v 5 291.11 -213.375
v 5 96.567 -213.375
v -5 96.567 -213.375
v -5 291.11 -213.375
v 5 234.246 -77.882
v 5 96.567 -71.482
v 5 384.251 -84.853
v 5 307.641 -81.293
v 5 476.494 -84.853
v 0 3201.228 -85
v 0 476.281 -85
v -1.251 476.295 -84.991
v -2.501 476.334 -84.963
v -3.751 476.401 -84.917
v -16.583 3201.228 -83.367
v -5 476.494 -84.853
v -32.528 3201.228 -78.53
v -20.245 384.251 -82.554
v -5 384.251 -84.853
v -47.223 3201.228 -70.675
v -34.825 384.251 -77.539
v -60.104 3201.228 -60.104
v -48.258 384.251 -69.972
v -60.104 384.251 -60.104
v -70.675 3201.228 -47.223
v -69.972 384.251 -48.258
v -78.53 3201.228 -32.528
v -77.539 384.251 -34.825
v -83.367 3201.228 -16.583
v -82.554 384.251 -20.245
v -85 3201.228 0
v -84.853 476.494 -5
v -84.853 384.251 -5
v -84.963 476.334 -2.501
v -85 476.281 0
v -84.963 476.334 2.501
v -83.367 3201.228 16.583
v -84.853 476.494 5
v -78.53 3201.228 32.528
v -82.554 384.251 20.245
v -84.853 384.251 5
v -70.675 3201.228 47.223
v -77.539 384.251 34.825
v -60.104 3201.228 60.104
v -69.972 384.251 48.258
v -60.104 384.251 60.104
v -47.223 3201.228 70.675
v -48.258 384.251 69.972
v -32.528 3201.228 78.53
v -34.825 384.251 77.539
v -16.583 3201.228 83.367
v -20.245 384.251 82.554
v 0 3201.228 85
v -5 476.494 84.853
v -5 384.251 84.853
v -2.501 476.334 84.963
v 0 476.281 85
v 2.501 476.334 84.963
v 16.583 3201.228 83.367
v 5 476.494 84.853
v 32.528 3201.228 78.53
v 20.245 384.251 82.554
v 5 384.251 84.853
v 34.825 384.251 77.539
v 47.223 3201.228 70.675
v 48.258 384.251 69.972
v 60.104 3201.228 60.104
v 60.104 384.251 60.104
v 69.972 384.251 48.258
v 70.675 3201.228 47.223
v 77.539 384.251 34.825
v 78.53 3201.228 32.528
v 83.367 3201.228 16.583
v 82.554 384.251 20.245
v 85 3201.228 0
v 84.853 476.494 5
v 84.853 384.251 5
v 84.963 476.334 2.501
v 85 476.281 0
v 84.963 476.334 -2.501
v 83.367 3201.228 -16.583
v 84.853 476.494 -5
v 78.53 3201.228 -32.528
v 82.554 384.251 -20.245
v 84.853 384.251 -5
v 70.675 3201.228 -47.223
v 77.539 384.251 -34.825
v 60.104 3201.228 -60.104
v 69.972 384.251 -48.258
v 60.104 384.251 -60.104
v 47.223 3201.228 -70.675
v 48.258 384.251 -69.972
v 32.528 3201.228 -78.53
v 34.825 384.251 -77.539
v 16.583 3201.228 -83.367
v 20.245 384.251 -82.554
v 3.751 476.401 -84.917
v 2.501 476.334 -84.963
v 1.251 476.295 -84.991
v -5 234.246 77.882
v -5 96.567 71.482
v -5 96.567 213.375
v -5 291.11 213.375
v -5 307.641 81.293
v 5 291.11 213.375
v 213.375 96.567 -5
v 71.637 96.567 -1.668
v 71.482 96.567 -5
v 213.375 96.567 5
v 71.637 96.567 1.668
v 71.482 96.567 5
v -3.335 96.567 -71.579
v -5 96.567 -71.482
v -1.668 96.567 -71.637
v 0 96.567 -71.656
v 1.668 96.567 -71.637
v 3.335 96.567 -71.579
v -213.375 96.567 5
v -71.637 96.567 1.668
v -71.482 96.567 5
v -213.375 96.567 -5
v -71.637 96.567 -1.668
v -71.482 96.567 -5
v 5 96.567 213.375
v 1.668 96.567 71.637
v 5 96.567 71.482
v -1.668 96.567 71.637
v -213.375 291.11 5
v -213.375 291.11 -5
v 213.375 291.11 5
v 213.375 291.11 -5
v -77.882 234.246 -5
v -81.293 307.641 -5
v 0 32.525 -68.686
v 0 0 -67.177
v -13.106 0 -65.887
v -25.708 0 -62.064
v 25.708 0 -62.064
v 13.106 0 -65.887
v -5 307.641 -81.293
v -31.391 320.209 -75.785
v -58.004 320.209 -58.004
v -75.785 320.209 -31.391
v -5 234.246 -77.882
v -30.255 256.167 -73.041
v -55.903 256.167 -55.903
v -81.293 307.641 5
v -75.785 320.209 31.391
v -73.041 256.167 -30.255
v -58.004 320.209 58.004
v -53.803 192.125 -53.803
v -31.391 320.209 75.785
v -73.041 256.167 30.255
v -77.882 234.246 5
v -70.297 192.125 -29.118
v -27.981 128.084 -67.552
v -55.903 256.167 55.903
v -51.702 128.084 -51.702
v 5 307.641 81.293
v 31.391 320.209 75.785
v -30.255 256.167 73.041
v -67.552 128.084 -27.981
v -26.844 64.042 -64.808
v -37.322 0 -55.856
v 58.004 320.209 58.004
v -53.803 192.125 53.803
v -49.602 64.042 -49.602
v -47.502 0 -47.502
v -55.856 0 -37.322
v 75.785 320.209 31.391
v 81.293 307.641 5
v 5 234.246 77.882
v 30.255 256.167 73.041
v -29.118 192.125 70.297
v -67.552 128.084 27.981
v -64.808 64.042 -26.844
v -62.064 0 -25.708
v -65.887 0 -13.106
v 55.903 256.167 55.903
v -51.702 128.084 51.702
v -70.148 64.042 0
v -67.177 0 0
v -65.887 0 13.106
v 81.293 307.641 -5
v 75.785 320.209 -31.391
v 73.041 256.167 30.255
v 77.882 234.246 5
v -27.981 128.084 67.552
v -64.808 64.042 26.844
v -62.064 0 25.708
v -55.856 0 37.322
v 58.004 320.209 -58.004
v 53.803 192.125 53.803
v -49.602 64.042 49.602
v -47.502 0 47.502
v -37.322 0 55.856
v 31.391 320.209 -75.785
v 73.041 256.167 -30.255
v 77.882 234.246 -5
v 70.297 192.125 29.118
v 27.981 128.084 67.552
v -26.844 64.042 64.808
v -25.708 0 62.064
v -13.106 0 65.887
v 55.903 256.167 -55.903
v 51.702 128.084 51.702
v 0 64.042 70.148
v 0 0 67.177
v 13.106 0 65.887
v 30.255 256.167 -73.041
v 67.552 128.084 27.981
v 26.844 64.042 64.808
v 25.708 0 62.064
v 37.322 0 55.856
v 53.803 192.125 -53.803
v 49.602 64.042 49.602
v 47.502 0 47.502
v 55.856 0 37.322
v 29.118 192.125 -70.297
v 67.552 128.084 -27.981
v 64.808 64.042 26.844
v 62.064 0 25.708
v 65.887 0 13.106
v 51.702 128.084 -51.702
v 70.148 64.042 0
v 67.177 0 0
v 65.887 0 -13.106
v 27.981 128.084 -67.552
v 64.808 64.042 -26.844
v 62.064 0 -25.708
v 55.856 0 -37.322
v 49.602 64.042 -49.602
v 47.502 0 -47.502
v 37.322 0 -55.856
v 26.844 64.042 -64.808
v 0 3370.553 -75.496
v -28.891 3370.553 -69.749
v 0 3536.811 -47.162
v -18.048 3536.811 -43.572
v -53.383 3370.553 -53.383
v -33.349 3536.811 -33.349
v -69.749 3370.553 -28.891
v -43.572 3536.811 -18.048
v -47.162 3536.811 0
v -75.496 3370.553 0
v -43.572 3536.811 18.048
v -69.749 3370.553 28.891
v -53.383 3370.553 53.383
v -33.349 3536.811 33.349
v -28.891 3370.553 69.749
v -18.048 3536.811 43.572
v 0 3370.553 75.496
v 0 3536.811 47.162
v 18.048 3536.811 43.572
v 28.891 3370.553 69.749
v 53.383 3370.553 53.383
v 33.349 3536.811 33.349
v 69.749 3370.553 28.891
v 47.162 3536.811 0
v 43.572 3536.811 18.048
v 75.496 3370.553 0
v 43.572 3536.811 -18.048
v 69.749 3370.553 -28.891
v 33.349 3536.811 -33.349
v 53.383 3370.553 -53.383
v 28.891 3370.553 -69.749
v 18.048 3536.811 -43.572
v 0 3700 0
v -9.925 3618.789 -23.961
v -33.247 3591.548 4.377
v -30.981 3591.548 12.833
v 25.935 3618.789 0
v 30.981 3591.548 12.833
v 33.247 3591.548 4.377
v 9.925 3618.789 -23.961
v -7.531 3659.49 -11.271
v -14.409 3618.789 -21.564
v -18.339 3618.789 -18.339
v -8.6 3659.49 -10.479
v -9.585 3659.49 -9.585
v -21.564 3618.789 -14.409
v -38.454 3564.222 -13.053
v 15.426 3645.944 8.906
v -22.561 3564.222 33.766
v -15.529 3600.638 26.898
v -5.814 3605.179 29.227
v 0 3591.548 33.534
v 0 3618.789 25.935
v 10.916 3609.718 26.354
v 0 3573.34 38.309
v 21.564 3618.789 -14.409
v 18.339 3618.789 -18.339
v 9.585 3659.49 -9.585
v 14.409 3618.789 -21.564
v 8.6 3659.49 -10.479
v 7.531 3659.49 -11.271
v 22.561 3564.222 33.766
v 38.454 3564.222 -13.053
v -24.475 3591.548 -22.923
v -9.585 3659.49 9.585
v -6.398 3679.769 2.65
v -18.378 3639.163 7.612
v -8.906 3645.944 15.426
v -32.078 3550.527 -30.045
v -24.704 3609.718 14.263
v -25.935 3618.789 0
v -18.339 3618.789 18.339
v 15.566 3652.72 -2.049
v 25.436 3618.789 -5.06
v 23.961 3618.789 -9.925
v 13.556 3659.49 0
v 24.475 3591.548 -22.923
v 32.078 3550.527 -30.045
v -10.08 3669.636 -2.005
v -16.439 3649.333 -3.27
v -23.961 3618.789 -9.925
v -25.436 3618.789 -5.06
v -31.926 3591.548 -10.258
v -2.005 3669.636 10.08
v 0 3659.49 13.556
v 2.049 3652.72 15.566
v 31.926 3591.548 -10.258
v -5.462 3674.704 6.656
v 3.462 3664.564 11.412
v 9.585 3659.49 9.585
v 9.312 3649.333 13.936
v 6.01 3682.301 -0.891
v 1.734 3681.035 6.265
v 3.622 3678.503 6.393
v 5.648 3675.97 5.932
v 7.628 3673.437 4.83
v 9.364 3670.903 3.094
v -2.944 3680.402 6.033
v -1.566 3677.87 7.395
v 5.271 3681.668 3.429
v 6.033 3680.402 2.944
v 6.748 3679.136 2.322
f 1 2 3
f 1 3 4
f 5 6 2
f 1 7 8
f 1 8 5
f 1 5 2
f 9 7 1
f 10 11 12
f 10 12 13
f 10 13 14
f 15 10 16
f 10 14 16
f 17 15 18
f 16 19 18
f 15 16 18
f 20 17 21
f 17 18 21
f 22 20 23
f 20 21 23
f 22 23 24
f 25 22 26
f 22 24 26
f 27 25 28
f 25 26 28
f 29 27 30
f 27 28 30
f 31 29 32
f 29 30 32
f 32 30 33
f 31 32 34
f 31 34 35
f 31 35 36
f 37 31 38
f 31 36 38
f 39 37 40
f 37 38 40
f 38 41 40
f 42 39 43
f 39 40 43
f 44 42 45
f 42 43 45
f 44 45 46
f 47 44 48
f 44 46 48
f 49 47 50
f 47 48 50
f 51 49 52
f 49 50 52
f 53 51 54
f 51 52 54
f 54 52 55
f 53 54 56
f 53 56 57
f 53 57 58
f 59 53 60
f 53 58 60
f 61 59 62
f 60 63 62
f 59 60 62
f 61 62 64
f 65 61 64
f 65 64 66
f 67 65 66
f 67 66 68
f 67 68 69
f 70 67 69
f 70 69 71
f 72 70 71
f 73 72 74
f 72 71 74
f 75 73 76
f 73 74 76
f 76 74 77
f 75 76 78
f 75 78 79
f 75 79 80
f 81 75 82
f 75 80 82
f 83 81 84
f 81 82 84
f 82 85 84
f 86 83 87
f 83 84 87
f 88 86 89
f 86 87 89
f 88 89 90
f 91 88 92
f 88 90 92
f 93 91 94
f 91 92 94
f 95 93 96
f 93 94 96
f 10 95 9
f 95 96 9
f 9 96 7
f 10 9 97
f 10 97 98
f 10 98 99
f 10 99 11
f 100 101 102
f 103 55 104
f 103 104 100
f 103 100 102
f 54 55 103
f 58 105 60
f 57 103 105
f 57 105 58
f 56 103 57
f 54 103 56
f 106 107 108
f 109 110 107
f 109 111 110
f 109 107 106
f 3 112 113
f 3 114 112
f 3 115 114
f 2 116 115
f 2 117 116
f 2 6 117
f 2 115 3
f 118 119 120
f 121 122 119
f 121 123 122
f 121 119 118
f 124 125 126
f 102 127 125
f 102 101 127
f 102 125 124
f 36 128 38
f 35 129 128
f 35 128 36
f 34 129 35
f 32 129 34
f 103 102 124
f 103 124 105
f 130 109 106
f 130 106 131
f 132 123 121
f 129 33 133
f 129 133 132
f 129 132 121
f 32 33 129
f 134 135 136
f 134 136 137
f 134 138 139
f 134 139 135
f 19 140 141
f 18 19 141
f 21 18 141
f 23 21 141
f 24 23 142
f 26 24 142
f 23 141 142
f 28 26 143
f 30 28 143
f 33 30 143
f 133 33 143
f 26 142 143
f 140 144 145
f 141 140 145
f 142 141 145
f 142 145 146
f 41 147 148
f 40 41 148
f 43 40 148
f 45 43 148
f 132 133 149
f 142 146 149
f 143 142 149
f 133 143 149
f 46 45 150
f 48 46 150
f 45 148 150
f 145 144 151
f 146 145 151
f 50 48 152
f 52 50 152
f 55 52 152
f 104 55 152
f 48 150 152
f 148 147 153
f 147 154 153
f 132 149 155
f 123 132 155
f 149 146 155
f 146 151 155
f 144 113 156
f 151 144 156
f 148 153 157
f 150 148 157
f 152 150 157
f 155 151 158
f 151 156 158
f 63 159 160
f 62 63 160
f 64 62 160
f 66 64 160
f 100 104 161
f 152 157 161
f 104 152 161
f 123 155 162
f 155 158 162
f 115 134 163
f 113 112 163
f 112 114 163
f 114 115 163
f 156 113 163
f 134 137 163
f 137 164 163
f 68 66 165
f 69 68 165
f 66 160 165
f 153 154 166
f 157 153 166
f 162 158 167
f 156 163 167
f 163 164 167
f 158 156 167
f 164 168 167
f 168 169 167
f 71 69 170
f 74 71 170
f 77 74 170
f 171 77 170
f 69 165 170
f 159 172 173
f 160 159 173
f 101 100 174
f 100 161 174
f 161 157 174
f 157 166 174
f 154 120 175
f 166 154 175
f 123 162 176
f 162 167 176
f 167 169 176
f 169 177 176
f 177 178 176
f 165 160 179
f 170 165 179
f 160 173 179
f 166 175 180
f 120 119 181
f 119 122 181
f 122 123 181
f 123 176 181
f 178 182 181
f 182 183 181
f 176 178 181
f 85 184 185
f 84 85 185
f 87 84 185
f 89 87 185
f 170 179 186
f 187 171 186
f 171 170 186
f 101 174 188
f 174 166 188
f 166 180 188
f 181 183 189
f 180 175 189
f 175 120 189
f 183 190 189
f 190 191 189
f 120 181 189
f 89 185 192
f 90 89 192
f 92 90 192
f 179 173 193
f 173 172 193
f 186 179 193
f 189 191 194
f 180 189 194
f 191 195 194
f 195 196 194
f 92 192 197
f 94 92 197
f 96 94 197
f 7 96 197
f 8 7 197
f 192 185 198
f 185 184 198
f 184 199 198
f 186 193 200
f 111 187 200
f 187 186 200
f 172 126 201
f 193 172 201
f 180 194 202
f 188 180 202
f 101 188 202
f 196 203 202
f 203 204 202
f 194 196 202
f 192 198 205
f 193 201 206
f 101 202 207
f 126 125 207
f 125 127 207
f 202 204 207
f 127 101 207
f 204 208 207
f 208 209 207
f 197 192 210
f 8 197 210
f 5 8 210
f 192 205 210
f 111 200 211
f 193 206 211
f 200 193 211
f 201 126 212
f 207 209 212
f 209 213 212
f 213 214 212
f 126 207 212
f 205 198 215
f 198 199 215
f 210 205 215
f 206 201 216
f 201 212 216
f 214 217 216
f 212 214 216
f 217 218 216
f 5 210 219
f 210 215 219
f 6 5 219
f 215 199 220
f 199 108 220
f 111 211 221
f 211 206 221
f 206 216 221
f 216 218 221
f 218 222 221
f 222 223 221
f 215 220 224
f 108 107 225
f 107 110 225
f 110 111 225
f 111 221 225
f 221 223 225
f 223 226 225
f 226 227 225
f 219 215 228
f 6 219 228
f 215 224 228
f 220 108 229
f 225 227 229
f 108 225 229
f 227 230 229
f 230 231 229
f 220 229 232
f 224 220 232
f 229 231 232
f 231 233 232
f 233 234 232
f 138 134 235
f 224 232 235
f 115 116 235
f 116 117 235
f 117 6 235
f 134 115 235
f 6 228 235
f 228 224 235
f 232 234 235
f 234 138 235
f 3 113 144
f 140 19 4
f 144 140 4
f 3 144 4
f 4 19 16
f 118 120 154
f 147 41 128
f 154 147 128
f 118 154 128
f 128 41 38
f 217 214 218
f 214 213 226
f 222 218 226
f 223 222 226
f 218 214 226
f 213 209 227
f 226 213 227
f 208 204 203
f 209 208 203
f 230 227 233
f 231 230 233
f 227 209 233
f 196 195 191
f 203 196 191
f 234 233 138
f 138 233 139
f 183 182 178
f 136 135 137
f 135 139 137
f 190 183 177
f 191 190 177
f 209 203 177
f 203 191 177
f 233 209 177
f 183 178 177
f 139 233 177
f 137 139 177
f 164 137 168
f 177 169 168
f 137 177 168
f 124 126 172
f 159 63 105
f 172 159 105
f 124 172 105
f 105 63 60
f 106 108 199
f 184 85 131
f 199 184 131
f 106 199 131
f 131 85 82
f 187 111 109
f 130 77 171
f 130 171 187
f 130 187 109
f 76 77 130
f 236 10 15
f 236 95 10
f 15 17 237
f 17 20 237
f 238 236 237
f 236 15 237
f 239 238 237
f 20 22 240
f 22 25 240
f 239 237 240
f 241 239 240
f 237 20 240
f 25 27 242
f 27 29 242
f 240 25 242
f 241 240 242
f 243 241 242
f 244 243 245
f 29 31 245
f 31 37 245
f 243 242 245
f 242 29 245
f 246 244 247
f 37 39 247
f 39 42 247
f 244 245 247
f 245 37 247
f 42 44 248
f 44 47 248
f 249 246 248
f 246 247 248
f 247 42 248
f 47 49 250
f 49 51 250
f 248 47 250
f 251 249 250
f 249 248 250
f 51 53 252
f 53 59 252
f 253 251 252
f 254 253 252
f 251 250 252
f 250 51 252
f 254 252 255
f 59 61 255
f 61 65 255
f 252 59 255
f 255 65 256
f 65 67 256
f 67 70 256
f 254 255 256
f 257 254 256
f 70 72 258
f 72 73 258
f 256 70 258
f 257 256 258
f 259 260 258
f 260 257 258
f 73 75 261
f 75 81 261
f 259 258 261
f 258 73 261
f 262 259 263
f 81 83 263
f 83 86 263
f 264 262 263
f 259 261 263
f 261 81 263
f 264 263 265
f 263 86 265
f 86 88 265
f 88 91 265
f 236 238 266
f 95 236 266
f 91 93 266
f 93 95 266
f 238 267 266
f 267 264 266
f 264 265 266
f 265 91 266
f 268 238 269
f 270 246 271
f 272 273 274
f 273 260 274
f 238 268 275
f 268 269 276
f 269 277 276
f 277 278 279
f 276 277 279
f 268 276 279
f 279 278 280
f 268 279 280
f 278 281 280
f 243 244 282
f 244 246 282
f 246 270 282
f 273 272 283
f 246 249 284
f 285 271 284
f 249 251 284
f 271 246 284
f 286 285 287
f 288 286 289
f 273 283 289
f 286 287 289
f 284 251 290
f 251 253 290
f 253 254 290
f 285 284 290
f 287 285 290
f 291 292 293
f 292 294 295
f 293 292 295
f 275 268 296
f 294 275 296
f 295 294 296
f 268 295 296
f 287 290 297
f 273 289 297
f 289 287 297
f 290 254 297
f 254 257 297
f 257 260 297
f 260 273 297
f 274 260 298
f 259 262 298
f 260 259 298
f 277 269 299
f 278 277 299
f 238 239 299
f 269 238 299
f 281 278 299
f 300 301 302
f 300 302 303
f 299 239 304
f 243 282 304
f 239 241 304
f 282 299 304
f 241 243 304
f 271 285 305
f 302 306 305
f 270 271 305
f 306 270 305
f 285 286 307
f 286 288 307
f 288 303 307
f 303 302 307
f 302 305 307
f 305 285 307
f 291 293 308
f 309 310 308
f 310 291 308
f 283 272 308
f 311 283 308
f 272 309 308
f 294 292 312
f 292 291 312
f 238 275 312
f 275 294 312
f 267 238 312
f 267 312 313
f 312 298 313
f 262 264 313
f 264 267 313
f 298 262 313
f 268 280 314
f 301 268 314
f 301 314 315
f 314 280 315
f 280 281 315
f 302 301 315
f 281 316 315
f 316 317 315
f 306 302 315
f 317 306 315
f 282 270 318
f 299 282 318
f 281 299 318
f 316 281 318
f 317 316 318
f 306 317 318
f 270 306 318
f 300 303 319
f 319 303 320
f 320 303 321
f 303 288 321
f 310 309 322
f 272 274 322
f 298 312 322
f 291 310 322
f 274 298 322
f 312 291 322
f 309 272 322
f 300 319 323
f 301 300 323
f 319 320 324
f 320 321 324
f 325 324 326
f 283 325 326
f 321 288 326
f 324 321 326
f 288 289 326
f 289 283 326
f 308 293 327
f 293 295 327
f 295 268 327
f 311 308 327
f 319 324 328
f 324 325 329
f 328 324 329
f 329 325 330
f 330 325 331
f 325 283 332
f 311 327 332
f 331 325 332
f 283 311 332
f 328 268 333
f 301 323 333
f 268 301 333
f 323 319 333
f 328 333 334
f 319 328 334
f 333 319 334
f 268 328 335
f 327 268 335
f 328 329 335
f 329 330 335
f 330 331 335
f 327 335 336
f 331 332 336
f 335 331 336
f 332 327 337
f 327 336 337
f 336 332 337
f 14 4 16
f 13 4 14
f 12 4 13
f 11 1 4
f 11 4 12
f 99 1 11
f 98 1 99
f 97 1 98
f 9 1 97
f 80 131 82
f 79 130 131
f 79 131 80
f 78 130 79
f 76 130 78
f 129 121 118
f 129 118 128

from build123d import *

# Parameters (mm, degrees)
BOSS_EXTRUDE1_DEPTH = 5
CIRPATTERN1_COUNT   = 4


with BuildPart() as part:
    # Sketch2 → Revolve1 (revolve)
    with BuildSketch(Plane.XY):
        with BuildLine():
            Line((0, 0), (0, 3700))
            add(Edge.make_bspline(
                [(0, 3700), (84.865215283, 3457.516619443), (85, 3201.228293863)],
                knots=[0, 0, 0, 1, 1, 1], degree=2))
            Line((85, 3201.228293863), (85, 384.250664913))
            Line((85, 384.250664913), (67.177442708, 0))
            Line((67.177442708, 0), (0, 0))
        make_face()
    revolve(axis=Axis((0, 0, 0), (0, 1, 0)))

    # Sketch3 → Boss-Extrude1 (add, symmetric)
    with BuildSketch(Plane(origin=(0, 0, 0), x_dir=(0, 0, -1), z_dir=(1, 0, 0))):
        Polygon((45.900059678, 532.679877614), (45.900059678, 96.566896632), (213.375004626, 96.566896632), (213.375004626, 291.110499158), align=None)
    boss_extrude1 = extrude(amount=BOSS_EXTRUDE1_DEPTH, both=True)

    # CirPattern1: Boss-Extrude1 ×4 about axis
    cirpattern1_axis = Axis((0, 3700, 0), (0, -1, 0))
    for i in range(1, CIRPATTERN1_COUNT):
        add(boss_extrude1.rotate(cirpattern1_axis, i * 360 / CIRPATTERN1_COUNT))


solid = part.part
